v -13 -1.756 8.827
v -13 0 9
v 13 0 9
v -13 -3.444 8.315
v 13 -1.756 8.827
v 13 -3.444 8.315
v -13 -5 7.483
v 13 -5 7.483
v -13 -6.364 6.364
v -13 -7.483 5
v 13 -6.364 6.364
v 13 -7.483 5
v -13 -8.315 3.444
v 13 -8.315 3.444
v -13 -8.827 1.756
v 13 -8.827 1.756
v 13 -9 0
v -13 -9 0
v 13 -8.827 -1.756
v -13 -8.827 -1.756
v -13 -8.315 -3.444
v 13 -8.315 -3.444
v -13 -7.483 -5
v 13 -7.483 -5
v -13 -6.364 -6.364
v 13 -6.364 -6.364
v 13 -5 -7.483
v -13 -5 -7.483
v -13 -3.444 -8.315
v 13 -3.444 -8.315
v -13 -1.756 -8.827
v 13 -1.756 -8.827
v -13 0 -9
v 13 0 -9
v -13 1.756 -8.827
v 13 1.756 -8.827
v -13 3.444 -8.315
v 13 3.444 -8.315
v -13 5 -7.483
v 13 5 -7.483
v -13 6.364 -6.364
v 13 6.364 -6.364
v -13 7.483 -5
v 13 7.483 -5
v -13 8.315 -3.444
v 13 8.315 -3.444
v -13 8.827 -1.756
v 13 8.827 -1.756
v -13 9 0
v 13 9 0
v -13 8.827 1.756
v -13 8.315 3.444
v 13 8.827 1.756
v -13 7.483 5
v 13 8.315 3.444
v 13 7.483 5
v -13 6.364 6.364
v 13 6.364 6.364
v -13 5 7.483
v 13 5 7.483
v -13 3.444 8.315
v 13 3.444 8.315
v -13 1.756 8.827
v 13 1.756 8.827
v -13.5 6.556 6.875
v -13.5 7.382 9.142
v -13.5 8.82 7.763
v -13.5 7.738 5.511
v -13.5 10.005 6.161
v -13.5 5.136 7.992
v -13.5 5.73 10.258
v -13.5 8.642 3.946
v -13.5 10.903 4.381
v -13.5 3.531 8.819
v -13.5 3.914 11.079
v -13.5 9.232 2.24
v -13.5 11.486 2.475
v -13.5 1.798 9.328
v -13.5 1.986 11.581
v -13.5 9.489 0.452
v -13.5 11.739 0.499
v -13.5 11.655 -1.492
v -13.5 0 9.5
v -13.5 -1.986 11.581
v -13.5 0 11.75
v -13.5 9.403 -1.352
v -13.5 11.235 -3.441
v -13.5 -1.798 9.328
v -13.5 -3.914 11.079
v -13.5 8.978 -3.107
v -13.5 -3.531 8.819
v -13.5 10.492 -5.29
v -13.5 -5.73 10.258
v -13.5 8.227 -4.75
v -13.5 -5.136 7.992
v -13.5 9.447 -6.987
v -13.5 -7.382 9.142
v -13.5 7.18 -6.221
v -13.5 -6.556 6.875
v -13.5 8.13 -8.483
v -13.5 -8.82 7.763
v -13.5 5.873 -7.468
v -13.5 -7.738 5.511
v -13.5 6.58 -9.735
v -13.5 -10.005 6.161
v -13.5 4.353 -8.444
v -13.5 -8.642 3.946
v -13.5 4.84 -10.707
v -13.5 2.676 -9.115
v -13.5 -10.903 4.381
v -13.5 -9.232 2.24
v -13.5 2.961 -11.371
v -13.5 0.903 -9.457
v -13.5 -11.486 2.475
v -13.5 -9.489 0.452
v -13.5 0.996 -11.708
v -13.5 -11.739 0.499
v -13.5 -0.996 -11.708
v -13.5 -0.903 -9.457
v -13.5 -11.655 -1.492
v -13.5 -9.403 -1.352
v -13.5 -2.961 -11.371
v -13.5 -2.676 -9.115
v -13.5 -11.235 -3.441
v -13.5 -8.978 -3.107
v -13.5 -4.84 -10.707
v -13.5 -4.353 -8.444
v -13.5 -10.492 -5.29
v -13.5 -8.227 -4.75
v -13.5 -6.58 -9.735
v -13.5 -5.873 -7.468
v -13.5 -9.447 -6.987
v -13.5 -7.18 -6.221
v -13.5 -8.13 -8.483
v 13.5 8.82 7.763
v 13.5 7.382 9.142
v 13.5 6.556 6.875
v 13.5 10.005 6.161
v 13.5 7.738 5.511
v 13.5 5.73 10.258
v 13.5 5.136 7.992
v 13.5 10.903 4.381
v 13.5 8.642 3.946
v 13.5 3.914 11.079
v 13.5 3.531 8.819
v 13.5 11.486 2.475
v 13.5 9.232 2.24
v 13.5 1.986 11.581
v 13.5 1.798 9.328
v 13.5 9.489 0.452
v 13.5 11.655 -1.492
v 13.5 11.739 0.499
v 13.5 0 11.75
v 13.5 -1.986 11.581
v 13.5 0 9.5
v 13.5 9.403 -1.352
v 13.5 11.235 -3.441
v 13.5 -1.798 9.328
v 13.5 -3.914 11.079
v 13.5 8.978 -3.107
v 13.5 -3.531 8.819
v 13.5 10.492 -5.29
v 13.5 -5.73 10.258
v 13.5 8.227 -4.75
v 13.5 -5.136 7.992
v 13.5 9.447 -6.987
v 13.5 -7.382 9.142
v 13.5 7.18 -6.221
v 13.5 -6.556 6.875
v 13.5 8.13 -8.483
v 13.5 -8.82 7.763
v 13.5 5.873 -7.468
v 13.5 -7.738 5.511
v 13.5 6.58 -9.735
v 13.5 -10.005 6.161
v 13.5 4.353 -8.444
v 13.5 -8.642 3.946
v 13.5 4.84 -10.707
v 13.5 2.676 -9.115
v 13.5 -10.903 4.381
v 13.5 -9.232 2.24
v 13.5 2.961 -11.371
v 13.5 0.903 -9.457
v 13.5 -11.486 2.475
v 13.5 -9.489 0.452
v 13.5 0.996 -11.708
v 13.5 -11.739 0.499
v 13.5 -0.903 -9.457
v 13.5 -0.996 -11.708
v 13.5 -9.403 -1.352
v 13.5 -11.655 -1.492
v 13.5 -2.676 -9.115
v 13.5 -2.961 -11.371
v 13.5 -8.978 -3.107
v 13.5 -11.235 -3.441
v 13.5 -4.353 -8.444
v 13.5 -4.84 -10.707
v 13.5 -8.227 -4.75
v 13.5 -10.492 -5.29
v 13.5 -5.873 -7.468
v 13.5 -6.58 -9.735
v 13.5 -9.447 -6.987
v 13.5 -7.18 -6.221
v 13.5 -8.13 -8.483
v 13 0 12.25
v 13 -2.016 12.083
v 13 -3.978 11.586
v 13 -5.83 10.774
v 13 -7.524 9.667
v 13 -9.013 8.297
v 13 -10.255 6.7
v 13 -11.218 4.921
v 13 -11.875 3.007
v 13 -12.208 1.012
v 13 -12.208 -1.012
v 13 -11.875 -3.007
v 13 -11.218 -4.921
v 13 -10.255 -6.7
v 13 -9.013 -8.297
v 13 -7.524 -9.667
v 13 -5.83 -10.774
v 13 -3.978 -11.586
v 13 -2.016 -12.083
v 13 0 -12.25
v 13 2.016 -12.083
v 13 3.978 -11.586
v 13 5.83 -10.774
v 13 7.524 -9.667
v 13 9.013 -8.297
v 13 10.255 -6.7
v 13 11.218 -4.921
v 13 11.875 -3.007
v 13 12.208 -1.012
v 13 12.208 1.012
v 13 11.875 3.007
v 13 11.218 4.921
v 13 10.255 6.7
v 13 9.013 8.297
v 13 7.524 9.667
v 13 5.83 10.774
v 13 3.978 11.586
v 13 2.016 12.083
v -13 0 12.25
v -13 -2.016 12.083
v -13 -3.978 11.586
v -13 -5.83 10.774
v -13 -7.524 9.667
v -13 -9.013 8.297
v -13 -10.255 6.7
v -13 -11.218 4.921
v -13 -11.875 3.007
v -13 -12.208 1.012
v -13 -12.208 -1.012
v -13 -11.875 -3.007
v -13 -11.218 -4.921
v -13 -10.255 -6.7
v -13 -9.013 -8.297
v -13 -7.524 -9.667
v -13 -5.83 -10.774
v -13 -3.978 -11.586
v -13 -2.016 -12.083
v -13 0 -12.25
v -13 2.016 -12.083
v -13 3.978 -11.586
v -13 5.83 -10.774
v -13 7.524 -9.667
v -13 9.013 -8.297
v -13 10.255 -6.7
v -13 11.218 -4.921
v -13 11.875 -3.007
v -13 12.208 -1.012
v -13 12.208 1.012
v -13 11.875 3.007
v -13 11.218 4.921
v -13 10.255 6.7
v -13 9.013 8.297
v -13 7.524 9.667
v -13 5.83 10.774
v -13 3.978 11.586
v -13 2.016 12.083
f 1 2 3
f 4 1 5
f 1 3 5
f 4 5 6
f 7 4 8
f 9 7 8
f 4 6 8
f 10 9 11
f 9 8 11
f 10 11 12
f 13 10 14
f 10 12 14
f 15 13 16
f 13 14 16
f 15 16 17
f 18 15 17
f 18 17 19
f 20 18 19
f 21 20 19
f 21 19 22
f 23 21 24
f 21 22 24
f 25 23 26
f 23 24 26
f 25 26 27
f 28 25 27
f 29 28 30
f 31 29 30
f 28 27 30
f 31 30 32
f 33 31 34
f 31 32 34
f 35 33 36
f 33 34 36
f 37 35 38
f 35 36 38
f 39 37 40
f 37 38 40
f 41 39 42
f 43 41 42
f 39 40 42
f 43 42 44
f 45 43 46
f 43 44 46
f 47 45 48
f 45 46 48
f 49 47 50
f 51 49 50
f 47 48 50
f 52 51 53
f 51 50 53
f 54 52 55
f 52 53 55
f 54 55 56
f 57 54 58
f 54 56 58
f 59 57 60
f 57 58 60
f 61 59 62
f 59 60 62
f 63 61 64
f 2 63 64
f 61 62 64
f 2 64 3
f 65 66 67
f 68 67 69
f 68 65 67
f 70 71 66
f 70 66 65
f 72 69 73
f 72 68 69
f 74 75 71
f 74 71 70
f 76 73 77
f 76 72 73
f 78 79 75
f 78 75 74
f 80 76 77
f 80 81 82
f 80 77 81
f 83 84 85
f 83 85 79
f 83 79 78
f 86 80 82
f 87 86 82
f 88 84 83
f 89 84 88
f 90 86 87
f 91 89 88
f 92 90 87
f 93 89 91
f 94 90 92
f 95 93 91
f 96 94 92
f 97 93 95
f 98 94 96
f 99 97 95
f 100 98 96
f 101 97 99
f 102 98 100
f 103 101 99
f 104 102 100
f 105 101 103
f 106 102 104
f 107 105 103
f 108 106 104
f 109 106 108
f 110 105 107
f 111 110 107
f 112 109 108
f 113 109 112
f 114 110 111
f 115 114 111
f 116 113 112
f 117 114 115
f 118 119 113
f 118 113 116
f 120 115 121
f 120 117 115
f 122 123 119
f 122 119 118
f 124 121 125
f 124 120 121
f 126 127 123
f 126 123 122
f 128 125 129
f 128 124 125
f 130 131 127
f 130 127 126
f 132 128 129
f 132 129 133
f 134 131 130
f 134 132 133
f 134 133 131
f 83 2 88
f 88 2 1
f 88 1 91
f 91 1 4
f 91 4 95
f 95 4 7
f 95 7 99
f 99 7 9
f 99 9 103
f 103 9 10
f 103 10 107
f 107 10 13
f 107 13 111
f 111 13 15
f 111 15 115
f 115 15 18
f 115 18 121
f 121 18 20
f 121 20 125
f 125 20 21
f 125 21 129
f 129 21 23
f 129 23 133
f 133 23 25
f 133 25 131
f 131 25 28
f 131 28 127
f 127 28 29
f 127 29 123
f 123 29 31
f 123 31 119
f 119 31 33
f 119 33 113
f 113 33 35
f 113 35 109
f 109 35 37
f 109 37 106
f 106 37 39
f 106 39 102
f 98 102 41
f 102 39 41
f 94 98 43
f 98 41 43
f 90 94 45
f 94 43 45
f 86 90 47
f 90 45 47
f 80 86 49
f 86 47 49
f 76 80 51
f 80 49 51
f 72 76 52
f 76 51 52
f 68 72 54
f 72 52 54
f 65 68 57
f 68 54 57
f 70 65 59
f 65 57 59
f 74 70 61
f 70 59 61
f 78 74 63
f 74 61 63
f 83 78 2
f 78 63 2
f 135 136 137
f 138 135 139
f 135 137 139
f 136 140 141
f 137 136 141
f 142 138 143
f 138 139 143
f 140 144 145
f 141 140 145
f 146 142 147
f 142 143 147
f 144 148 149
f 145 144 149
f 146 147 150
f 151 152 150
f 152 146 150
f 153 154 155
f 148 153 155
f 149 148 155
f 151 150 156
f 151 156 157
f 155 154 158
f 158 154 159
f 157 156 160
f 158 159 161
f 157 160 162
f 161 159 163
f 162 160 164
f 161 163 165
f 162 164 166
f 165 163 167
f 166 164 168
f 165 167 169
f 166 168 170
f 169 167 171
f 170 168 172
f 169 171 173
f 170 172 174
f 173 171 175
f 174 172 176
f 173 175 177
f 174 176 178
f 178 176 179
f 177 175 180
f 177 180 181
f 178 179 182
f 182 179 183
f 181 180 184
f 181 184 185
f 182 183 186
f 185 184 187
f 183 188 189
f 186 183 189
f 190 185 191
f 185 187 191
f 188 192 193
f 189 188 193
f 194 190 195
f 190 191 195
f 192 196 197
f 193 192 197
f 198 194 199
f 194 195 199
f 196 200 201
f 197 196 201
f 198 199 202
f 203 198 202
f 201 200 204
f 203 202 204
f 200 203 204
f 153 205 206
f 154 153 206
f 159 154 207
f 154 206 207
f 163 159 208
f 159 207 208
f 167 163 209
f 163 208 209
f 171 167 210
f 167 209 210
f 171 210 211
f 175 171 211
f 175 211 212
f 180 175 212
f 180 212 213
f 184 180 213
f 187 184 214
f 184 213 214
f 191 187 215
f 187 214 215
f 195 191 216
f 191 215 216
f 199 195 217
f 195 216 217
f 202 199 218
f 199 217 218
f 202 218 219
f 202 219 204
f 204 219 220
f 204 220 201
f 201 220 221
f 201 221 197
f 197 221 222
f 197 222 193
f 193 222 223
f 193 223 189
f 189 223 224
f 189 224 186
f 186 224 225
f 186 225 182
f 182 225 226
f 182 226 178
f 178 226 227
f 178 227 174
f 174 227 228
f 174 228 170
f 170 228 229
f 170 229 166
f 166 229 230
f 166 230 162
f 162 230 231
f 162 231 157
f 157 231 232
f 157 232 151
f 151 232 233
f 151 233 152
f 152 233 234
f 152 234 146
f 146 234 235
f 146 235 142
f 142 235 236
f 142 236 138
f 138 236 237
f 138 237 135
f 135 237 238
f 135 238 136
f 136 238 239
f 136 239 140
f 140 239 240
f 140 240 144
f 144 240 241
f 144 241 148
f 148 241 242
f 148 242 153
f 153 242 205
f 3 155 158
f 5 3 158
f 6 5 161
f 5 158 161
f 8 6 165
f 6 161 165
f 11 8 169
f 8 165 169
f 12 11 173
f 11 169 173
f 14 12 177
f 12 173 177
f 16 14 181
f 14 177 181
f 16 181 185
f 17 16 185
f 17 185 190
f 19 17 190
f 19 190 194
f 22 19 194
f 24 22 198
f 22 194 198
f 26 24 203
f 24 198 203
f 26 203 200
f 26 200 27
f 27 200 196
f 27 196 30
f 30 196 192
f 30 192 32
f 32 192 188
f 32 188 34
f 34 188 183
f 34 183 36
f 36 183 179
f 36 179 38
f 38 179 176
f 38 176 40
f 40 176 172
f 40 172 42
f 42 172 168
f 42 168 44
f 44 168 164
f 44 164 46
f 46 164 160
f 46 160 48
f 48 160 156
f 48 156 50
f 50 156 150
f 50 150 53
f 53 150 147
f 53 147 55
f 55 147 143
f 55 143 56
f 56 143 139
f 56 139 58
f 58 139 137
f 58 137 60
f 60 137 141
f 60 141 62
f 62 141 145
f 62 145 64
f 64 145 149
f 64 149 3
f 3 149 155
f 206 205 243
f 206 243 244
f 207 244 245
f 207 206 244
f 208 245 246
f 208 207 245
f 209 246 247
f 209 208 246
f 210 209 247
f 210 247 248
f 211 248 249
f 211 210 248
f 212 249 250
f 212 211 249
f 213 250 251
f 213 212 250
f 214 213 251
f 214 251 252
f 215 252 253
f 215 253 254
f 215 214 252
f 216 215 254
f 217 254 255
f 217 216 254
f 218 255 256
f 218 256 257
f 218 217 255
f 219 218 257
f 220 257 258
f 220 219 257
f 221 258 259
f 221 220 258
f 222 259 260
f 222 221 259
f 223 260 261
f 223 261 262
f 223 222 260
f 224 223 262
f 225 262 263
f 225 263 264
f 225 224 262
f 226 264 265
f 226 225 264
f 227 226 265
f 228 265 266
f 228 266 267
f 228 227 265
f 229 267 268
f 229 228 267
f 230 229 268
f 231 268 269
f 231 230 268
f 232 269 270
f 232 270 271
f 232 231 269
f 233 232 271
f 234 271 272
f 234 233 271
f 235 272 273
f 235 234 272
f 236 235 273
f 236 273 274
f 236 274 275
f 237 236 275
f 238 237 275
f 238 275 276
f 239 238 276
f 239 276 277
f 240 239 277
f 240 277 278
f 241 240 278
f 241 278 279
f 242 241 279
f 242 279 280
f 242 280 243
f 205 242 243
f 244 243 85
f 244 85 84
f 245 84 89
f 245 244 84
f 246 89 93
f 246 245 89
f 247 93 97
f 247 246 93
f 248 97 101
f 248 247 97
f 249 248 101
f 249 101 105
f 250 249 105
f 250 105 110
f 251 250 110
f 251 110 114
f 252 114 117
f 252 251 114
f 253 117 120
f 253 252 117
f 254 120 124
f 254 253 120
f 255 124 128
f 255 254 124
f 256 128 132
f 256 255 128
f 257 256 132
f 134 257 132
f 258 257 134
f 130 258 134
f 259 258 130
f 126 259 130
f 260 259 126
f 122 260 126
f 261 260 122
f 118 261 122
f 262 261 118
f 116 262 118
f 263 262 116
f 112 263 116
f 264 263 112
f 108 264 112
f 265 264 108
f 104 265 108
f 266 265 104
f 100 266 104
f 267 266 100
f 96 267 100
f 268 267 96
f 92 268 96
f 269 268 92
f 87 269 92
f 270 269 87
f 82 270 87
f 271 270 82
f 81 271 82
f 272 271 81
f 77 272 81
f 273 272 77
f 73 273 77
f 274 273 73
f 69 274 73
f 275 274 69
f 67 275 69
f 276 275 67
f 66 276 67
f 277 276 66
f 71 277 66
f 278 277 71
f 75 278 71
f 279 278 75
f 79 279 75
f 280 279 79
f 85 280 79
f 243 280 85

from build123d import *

# Parameters (mm, degrees)
ESQUISSE1_W     = 27
ESQUISSE1_H     = 3.25
CHANFREIN1_SIZE = 0.5


with BuildPart() as part:
    # Esquisse1 → Base-Révol.-Mince (revolve)
    with BuildSketch(Plane.XY, mode=Mode.PRIVATE) as base_r_vol_mince_sk:
        with Locations((0, 10.625)):
            Rectangle(ESQUISSE1_W, ESQUISSE1_H)
    revolve(base_r_vol_mince_sk.sketch.rotate(Axis((0, 0, 0), (1, 0, 0)), 90), axis=Axis((0, 0, 0), (1, 0, 0)))

    # Chanfrein1
    chanfrein1_edges = [part.edges().sort_by_distance(p)[0] for p in [
        (-13.5, 0, -12.25),
        (13.5, 0, -12.25),
        (13.5, 0, -9),
        (-13.5, 0, -9),
    ]]
    chamfer(chanfrein1_edges, length=CHANFREIN1_SIZE)


solid = part.part
